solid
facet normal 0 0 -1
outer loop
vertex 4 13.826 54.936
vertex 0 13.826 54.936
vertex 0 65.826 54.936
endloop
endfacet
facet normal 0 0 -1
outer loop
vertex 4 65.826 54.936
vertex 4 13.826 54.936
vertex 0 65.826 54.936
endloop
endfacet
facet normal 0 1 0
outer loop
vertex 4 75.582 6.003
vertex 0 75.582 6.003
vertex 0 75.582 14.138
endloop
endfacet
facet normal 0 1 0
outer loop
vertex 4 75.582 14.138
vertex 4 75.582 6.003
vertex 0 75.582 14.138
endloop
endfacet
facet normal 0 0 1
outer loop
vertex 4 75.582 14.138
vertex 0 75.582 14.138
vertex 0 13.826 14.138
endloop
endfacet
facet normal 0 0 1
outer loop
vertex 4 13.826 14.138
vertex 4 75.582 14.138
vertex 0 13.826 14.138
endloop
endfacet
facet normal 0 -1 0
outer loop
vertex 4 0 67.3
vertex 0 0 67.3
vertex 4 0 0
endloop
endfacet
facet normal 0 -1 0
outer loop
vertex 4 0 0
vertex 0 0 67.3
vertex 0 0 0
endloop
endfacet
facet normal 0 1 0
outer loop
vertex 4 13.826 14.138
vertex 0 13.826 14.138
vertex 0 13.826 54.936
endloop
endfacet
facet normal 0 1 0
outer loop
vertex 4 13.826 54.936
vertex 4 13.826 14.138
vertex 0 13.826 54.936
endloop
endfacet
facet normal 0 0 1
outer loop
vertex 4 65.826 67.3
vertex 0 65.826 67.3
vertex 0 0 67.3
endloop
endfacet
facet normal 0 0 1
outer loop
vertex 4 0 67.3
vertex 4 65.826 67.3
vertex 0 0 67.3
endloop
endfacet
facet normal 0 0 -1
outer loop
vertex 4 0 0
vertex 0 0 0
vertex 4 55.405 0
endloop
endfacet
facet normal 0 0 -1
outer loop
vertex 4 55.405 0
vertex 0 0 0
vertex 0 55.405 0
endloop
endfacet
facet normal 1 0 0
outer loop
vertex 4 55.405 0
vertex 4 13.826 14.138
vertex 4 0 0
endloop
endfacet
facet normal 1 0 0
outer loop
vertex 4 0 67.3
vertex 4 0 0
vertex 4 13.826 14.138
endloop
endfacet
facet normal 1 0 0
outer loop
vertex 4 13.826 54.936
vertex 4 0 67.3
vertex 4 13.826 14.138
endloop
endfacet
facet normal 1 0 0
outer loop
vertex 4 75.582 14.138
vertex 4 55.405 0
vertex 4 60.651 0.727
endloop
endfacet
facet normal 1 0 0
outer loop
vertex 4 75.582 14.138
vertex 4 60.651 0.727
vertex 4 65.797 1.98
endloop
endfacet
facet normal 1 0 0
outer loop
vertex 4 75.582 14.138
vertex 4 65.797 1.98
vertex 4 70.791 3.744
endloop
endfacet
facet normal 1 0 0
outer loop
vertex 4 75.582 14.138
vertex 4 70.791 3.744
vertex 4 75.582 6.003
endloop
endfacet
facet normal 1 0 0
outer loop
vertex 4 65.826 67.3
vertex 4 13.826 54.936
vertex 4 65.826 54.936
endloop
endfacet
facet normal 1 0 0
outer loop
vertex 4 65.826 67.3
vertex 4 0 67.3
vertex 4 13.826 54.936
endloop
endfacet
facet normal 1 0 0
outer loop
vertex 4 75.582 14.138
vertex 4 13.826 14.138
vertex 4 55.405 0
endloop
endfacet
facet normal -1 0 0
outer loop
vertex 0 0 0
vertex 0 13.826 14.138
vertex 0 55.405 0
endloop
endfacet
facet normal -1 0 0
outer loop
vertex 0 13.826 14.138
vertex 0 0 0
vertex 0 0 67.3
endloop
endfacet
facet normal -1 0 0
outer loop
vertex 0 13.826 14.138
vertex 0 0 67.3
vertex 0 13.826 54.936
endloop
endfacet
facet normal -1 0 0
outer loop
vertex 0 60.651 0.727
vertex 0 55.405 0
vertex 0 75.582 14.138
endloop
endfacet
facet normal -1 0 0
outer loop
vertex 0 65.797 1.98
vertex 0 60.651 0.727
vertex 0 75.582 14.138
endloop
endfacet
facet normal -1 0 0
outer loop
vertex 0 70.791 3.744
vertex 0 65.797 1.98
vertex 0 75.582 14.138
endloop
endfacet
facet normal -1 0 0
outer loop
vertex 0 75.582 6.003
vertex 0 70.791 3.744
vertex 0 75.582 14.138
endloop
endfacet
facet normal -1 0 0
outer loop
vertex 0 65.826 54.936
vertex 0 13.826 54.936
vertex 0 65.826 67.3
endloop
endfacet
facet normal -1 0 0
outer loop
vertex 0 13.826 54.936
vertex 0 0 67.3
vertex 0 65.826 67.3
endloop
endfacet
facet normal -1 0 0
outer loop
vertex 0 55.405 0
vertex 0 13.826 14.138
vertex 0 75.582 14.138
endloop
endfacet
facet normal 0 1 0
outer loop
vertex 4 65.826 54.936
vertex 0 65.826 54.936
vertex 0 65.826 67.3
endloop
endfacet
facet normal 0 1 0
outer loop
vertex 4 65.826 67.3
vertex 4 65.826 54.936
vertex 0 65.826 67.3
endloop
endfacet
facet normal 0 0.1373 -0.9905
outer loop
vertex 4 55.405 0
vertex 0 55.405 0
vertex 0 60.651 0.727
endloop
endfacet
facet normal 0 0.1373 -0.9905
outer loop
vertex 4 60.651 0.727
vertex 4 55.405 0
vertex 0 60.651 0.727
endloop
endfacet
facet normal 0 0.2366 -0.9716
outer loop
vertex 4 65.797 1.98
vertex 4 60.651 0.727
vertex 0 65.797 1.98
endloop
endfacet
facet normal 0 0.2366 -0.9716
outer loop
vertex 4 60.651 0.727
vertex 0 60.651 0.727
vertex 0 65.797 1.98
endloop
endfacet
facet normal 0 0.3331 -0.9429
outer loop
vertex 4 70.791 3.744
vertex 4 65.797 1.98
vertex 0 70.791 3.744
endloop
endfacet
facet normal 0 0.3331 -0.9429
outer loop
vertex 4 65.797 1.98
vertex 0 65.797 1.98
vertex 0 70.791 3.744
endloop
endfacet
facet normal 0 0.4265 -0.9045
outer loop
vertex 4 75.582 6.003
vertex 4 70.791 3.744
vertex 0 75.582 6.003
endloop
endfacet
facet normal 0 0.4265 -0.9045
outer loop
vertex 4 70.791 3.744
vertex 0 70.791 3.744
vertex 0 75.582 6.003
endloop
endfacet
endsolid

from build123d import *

# Parameters (mm, degrees)
F1_DEPTH = 4


with BuildPart() as f1:
    # F0 (on Right) → F1 (new body)
    with BuildSketch(Plane.YZ):
        with BuildLine():
            Line((0, 67.3), (0, 0))
            Line((0, 0), (55.40454, 0))
            ThreePointArc((55.40454, 0), (65.797372, 1.979846), (75.582232, 6.003182))
            Line((75.582232, 6.003182), (75.582232, 14.138489))
            Line((75.582232, 14.138489), (13.826331, 14.138489))
            Line((13.826331, 14.138489), (13.826331, 54.936416))
            Line((13.826331, 54.936416), (65.826331, 54.936416))
            Line((65.826331, 54.936416), (65.826331, 67.3))
            Line((65.826331, 67.3), (0, 67.3))
        make_face()
    extrude(amount=F1_DEPTH)


solid = f1.part
